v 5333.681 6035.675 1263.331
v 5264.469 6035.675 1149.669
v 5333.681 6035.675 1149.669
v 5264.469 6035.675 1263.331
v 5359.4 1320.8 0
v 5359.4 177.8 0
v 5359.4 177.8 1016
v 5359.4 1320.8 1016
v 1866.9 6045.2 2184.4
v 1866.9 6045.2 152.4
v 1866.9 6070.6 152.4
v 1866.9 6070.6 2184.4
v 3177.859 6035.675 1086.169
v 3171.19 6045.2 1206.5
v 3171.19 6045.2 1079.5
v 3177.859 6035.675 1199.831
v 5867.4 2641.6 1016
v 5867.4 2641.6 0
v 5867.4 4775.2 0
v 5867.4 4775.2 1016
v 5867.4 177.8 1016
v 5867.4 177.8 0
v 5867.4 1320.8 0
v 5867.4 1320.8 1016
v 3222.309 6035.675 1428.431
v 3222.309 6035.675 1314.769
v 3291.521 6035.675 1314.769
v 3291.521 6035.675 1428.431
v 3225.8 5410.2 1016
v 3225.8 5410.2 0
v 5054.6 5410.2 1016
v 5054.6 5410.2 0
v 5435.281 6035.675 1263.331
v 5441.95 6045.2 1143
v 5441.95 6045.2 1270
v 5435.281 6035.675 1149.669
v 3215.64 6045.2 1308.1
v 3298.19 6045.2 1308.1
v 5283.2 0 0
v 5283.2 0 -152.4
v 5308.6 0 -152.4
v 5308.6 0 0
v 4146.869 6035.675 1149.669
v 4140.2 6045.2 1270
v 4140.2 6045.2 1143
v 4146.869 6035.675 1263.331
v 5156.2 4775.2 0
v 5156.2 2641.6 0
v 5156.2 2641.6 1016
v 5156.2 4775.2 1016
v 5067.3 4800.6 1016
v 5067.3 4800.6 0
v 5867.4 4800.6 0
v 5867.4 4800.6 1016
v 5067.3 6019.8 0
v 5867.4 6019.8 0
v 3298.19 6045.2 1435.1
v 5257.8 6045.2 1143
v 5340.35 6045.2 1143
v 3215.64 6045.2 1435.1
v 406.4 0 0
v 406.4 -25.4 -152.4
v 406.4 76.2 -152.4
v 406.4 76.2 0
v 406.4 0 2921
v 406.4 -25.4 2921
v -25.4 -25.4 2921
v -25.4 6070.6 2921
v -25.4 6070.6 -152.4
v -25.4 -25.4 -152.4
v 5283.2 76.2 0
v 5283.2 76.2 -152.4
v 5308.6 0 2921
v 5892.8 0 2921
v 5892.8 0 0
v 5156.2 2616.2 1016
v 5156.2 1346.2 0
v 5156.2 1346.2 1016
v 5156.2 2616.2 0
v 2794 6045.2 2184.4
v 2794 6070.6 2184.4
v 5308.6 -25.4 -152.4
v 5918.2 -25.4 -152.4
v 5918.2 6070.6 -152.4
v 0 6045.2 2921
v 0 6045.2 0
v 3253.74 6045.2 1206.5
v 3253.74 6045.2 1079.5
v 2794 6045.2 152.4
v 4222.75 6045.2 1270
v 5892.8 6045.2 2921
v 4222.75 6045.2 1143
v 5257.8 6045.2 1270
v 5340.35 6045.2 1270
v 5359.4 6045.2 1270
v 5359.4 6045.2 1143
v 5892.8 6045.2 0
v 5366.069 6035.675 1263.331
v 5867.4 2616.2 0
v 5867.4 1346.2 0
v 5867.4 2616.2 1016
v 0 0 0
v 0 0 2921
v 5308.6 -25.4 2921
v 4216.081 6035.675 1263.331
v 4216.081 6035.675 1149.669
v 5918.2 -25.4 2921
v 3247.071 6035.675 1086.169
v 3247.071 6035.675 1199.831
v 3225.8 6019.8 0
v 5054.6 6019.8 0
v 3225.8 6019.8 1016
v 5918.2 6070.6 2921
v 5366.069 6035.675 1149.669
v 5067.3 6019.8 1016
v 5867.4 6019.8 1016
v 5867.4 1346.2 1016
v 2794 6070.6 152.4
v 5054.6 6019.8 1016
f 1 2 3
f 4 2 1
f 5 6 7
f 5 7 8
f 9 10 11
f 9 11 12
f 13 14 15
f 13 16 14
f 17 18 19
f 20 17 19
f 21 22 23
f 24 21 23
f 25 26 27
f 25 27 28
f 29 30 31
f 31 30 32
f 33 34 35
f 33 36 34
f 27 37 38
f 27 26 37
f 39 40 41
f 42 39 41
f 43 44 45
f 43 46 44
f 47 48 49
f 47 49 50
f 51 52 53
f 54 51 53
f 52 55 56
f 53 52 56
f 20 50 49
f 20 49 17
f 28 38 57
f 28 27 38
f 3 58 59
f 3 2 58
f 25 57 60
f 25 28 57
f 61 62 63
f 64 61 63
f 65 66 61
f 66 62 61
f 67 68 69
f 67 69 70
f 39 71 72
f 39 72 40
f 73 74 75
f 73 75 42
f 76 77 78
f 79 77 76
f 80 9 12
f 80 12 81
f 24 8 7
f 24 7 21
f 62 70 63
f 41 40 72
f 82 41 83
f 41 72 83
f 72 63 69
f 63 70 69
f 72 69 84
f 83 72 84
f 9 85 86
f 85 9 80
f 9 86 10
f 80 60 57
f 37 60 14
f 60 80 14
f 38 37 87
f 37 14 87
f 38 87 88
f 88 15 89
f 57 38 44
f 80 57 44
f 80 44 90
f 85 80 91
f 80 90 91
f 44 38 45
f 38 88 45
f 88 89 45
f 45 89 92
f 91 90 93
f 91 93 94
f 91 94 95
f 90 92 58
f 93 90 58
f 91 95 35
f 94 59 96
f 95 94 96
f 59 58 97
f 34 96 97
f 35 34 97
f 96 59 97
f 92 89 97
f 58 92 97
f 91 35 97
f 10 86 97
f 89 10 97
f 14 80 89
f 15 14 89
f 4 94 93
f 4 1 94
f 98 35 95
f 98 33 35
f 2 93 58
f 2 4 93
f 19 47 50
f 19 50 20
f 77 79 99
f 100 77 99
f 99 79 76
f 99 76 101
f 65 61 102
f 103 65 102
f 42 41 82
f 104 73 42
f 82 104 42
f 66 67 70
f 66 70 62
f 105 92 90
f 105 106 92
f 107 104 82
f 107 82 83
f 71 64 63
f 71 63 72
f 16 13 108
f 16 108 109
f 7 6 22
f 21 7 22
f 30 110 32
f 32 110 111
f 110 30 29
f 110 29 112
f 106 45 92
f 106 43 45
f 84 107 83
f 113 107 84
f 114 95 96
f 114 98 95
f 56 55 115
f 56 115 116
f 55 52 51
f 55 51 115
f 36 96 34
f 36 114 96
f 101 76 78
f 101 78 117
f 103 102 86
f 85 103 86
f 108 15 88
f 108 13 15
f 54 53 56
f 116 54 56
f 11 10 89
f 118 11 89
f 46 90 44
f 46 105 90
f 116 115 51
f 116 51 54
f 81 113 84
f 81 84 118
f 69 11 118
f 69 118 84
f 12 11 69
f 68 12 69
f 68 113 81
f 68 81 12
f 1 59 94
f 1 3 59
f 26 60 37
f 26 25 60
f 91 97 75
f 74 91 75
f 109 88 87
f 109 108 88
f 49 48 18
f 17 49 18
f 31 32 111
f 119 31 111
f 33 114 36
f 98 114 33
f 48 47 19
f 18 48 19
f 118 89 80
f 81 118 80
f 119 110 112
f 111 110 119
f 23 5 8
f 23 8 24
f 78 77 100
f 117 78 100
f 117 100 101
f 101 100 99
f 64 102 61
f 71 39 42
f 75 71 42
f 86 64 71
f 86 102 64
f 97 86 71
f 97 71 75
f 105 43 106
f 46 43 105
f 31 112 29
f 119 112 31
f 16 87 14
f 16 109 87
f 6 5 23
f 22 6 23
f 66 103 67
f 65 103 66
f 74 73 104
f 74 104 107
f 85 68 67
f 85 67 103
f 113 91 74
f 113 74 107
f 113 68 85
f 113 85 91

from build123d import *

# Parameters (mm, degrees)
F1_DEPTH      = 152.4
F3_DEPTH      = 2921
F3_DEPTH_BACK = 152.4
F4_W          = 927.1
F4_H          = 2032
F5_DEPTH      = 25.4
F6_W          = 82.55
F6_H          = 127
F7_DEPTH      = 9.525
F7_TAPER      = 35
F8_W          = 1828.8
F8_H          = 609.6
F9_DEPTH      = 1016
F10_W         = 800.1
F10_H         = 1219.2
F11_DEPTH     = 1016
F13_W         = 711.2
F13_H         = 2133.6
F14_DEPTH     = 1016
F15_W         = 711.2
F15_H         = 1270
F16_DEPTH     = 1016
F17_W         = 508
F17_H         = 1143
F18_DEPTH     = 1016


with BuildPart() as f1:
    # F0 (on Top) → F1 (new body)
    with BuildSketch(Plane.XY):
        Polygon((0, 6045.2), (0, 0), (406.4, 0), (406.4, 76.2), (5283.2, 76.2), (5283.2, 0), (5892.8, 0), (5892.8, 6045.2), align=None)
    extrude(amount=-F1_DEPTH)

    # F2 (on Top) → F3 (join, two sides)
    with BuildSketch(Plane.XY) as f3_sk:
        Polygon((406.4, 0), (0, 0), (0, 6045.2), (5892.8, 6045.2), (5892.8, 0), (5308.6, 0), (5308.6, -25.4), (5918.2, -25.4), (5918.2, 6070.6), (-25.4, 6070.6), (-25.4, -25.4), (406.4, -25.4), align=None)
    extrude(amount=F3_DEPTH)
    extrude(f3_sk.sketch, amount=-F3_DEPTH_BACK)

    # F4 (on face) → F5 (cut)
    with BuildSketch(Plane.XZ.offset(-6045.2)):
        with Locations((2330.45, 1168.4)):
            Rectangle(F4_W, F4_H)
    extrude(amount=-F5_DEPTH, mode=Mode.SUBTRACT)

    # F6 (on face) → F7 (join)
    with BuildSketch(Plane.XZ.offset(-6045.2)):
        with Locations((3212.465, 1143)):
            Rectangle(F6_W, F6_H)
        with Locations((4181.475, 1206.5)):
            Rectangle(F6_W, F6_H)
        with Locations((3256.915, 1371.6)):
            Rectangle(F6_W, F6_H)
        with Locations((5400.675, 1206.5)):
            Rectangle(F6_W, F6_H)
        with Locations((5299.075, 1206.5)):
            Rectangle(F6_W, F6_H)
    extrude(amount=F7_DEPTH, taper=F7_TAPER)


with BuildPart() as f9:
    # F8 (on face) → F9 (new body)
    with BuildSketch(Plane.XY):
        with Locations((4140.2, 5715)):
            Rectangle(F8_W, F8_H)
    extrude(amount=F9_DEPTH)


with BuildPart() as f11:
    # F10 (on face) → F11 (new body)
    with BuildSketch(Plane.XY):
        with Locations((5467.35, 5410.2)):
            Rectangle(F10_W, F10_H)
    extrude(amount=F11_DEPTH)


with BuildPart() as f14:
    # F13 (on face) → F14 (new body)
    with BuildSketch(Plane.XY):
        with Locations((5511.8, 3708.4)):
            Rectangle(F13_W, F13_H)
    extrude(amount=F14_DEPTH)


with BuildPart() as f16:
    # F15 (on face) → F16 (new body)
    with BuildSketch(Plane.XY):
        with Locations((5511.8, 1981.2)):
            Rectangle(F15_W, F15_H)
    extrude(amount=F16_DEPTH)


with BuildPart() as f18:
    # F17 (on face) → F18 (new body)
    with BuildSketch(Plane.XY):
        with Locations((5613.4, 749.3)):
            Rectangle(F17_W, F17_H)
    extrude(amount=F18_DEPTH)


solid = Compound([f1.part, f9.part, f11.part, f14.part, f16.part, f18.part])
